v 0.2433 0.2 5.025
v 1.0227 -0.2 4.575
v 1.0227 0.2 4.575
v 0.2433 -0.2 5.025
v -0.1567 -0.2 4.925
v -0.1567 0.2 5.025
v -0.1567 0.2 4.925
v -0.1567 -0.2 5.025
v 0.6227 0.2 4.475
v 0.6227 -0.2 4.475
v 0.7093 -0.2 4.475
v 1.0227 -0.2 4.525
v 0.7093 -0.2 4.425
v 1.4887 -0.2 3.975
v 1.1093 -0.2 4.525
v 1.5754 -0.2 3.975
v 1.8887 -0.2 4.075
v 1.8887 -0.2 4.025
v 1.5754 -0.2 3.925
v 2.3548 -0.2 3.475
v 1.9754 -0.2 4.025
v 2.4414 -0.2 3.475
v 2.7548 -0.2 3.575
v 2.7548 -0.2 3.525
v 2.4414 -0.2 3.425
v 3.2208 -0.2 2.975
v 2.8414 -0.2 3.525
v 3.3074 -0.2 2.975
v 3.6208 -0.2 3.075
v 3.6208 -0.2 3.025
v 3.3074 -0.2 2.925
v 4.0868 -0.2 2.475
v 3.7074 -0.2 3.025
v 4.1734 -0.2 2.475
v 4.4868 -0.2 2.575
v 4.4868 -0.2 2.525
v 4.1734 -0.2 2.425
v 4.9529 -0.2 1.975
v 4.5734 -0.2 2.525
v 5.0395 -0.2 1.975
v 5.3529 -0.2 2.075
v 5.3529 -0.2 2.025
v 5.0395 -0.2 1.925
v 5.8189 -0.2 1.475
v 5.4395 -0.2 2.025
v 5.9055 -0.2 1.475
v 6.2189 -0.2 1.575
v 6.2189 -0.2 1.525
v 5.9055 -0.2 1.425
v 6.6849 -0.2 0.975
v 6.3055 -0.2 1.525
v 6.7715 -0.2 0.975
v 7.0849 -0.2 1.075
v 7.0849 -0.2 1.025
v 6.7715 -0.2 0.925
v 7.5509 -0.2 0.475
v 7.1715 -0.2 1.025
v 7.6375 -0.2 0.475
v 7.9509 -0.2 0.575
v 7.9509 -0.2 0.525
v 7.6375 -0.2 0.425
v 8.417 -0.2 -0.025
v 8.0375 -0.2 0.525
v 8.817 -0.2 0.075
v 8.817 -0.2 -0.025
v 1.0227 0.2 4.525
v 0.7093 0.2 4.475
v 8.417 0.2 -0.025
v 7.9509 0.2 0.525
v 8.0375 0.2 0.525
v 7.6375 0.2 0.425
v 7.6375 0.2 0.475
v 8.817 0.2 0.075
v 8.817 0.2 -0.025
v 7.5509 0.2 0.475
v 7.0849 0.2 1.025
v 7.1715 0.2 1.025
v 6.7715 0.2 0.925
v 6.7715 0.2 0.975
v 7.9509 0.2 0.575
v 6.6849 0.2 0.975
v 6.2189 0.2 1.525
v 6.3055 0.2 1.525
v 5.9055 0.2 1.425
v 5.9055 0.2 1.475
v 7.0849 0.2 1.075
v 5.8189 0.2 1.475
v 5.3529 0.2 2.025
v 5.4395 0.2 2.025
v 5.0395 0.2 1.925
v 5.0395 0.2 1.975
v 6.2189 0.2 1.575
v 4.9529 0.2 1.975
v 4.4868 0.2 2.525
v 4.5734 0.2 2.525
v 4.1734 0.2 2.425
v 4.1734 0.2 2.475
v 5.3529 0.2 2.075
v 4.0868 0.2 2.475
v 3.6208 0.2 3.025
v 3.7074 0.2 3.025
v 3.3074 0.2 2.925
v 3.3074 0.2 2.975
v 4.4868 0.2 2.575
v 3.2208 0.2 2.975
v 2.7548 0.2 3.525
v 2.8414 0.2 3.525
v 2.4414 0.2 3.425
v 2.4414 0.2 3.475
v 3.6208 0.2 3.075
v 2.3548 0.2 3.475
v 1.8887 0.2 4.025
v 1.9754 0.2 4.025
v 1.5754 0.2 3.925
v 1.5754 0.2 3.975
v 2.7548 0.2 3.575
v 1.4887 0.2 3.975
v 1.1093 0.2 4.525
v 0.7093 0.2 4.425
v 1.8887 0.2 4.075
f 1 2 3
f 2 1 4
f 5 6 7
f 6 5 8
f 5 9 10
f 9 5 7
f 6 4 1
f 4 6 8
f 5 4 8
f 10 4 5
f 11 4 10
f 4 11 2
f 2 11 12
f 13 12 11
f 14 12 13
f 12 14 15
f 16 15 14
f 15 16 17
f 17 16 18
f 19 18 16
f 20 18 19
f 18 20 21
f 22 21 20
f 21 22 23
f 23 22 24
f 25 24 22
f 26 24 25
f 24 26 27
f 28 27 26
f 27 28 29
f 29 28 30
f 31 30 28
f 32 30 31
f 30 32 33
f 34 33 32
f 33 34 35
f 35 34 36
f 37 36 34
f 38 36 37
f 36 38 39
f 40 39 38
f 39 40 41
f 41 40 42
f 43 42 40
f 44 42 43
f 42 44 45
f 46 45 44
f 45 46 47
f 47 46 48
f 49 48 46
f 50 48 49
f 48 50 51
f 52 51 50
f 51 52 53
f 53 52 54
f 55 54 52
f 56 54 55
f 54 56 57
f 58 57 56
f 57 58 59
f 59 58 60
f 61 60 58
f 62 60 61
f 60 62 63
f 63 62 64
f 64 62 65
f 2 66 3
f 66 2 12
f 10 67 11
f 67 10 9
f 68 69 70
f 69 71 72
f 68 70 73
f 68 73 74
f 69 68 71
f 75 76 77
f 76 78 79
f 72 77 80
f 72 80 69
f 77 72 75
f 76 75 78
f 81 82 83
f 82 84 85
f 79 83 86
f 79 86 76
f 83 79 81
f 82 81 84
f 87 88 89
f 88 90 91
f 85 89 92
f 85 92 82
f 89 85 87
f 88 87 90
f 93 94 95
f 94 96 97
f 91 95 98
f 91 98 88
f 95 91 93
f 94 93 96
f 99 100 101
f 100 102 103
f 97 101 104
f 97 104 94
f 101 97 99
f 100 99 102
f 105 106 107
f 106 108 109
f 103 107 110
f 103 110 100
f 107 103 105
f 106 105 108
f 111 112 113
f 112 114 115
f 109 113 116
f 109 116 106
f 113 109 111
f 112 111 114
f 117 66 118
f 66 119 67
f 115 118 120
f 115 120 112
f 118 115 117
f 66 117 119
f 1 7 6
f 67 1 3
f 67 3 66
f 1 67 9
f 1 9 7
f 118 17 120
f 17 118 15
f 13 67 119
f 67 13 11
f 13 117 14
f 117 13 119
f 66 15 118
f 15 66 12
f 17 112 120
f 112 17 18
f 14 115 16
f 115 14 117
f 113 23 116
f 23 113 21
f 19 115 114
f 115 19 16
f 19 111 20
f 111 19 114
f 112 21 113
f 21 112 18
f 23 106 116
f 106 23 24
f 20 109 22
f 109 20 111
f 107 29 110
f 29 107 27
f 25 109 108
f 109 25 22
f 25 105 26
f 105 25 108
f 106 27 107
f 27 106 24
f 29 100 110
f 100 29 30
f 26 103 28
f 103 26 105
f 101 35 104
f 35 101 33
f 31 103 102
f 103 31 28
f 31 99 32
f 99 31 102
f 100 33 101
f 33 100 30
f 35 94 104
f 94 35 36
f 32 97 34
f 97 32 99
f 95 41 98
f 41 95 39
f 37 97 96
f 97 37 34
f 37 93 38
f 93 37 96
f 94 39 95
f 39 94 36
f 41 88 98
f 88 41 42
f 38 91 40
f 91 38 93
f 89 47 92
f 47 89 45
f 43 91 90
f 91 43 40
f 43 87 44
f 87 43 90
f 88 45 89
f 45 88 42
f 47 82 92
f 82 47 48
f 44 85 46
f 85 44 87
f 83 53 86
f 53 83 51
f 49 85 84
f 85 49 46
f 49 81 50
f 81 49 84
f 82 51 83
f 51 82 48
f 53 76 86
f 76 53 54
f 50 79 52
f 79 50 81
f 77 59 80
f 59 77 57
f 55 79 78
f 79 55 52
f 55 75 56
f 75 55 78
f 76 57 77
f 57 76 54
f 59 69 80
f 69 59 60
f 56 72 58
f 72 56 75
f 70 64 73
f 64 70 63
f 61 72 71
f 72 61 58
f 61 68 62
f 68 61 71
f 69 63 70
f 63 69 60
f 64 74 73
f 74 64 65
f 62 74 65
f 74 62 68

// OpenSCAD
hull() {
    translate([0.043301270190000005, 0.0, 4.975]) cube([0.4, 0.4, 0.1], center=true);
    translate([0.82272413361, 0.0, 4.5249999999999995]) cube([0.4, 0.4, 0.1], center=true);
}


hull() {
    translate([0.90932667399, 0.0, 4.475]) cube([0.4, 0.4, 0.1], center=true);
    translate([1.6887495374100001, 0.0, 4.025]) cube([0.4, 0.4, 0.1], center=true);
}


hull() {
    translate([1.77535207779, 0.0, 3.975]) cube([0.4, 0.4, 0.1], center=true);
    translate([2.5547749412100003, 0.0, 3.525]) cube([0.4, 0.4, 0.1], center=true);
}


hull() {
    translate([2.641377481585, 0.0, 3.475]) cube([0.4, 0.4, 0.1], center=true);
    translate([3.420800344915, 0.0, 3.0250000000000004]) cube([0.4, 0.4, 0.1], center=true);
}


hull() {
    translate([3.50740288529, 0.0, 2.975]) cube([0.4, 0.4, 0.1], center=true);
    translate([4.28682574871, 0.0, 2.525]) cube([0.4, 0.4, 0.1], center=true);
}


hull() {
    translate([4.373428289095, 0.0, 2.475]) cube([0.4, 0.4, 0.1], center=true);
    translate([5.152851152605001, 0.0, 2.025]) cube([0.4, 0.4, 0.1], center=true);
}


hull() {
    translate([5.239453692990001, 0.0, 1.975]) cube([0.4, 0.4, 0.1], center=true);
    translate([6.01887655641, 0.0, 1.5250000000000001]) cube([0.4, 0.4, 0.1], center=true);
}


hull() {
    translate([6.105479096790001, 0.0, 1.475]) cube([0.4, 0.4, 0.1], center=true);
    translate([6.88490196021, 0.0, 1.025]) cube([0.4, 0.4, 0.1], center=true);
}


hull() {
    translate([6.97150450059, 0.0, 0.9750000000000001]) cube([0.4, 0.4, 0.1], center=true);
    translate([7.75092736401, 0.0, 0.525]) cube([0.4, 0.4, 0.1], center=true);
}


hull() {
    translate([7.83752990439, 0.0, 0.47500000000000003]) cube([0.4, 0.4, 0.1], center=true);
    translate([8.61695276781, 0.0, 0.025]) cube([0.4, 0.4, 0.1], center=true);
}
